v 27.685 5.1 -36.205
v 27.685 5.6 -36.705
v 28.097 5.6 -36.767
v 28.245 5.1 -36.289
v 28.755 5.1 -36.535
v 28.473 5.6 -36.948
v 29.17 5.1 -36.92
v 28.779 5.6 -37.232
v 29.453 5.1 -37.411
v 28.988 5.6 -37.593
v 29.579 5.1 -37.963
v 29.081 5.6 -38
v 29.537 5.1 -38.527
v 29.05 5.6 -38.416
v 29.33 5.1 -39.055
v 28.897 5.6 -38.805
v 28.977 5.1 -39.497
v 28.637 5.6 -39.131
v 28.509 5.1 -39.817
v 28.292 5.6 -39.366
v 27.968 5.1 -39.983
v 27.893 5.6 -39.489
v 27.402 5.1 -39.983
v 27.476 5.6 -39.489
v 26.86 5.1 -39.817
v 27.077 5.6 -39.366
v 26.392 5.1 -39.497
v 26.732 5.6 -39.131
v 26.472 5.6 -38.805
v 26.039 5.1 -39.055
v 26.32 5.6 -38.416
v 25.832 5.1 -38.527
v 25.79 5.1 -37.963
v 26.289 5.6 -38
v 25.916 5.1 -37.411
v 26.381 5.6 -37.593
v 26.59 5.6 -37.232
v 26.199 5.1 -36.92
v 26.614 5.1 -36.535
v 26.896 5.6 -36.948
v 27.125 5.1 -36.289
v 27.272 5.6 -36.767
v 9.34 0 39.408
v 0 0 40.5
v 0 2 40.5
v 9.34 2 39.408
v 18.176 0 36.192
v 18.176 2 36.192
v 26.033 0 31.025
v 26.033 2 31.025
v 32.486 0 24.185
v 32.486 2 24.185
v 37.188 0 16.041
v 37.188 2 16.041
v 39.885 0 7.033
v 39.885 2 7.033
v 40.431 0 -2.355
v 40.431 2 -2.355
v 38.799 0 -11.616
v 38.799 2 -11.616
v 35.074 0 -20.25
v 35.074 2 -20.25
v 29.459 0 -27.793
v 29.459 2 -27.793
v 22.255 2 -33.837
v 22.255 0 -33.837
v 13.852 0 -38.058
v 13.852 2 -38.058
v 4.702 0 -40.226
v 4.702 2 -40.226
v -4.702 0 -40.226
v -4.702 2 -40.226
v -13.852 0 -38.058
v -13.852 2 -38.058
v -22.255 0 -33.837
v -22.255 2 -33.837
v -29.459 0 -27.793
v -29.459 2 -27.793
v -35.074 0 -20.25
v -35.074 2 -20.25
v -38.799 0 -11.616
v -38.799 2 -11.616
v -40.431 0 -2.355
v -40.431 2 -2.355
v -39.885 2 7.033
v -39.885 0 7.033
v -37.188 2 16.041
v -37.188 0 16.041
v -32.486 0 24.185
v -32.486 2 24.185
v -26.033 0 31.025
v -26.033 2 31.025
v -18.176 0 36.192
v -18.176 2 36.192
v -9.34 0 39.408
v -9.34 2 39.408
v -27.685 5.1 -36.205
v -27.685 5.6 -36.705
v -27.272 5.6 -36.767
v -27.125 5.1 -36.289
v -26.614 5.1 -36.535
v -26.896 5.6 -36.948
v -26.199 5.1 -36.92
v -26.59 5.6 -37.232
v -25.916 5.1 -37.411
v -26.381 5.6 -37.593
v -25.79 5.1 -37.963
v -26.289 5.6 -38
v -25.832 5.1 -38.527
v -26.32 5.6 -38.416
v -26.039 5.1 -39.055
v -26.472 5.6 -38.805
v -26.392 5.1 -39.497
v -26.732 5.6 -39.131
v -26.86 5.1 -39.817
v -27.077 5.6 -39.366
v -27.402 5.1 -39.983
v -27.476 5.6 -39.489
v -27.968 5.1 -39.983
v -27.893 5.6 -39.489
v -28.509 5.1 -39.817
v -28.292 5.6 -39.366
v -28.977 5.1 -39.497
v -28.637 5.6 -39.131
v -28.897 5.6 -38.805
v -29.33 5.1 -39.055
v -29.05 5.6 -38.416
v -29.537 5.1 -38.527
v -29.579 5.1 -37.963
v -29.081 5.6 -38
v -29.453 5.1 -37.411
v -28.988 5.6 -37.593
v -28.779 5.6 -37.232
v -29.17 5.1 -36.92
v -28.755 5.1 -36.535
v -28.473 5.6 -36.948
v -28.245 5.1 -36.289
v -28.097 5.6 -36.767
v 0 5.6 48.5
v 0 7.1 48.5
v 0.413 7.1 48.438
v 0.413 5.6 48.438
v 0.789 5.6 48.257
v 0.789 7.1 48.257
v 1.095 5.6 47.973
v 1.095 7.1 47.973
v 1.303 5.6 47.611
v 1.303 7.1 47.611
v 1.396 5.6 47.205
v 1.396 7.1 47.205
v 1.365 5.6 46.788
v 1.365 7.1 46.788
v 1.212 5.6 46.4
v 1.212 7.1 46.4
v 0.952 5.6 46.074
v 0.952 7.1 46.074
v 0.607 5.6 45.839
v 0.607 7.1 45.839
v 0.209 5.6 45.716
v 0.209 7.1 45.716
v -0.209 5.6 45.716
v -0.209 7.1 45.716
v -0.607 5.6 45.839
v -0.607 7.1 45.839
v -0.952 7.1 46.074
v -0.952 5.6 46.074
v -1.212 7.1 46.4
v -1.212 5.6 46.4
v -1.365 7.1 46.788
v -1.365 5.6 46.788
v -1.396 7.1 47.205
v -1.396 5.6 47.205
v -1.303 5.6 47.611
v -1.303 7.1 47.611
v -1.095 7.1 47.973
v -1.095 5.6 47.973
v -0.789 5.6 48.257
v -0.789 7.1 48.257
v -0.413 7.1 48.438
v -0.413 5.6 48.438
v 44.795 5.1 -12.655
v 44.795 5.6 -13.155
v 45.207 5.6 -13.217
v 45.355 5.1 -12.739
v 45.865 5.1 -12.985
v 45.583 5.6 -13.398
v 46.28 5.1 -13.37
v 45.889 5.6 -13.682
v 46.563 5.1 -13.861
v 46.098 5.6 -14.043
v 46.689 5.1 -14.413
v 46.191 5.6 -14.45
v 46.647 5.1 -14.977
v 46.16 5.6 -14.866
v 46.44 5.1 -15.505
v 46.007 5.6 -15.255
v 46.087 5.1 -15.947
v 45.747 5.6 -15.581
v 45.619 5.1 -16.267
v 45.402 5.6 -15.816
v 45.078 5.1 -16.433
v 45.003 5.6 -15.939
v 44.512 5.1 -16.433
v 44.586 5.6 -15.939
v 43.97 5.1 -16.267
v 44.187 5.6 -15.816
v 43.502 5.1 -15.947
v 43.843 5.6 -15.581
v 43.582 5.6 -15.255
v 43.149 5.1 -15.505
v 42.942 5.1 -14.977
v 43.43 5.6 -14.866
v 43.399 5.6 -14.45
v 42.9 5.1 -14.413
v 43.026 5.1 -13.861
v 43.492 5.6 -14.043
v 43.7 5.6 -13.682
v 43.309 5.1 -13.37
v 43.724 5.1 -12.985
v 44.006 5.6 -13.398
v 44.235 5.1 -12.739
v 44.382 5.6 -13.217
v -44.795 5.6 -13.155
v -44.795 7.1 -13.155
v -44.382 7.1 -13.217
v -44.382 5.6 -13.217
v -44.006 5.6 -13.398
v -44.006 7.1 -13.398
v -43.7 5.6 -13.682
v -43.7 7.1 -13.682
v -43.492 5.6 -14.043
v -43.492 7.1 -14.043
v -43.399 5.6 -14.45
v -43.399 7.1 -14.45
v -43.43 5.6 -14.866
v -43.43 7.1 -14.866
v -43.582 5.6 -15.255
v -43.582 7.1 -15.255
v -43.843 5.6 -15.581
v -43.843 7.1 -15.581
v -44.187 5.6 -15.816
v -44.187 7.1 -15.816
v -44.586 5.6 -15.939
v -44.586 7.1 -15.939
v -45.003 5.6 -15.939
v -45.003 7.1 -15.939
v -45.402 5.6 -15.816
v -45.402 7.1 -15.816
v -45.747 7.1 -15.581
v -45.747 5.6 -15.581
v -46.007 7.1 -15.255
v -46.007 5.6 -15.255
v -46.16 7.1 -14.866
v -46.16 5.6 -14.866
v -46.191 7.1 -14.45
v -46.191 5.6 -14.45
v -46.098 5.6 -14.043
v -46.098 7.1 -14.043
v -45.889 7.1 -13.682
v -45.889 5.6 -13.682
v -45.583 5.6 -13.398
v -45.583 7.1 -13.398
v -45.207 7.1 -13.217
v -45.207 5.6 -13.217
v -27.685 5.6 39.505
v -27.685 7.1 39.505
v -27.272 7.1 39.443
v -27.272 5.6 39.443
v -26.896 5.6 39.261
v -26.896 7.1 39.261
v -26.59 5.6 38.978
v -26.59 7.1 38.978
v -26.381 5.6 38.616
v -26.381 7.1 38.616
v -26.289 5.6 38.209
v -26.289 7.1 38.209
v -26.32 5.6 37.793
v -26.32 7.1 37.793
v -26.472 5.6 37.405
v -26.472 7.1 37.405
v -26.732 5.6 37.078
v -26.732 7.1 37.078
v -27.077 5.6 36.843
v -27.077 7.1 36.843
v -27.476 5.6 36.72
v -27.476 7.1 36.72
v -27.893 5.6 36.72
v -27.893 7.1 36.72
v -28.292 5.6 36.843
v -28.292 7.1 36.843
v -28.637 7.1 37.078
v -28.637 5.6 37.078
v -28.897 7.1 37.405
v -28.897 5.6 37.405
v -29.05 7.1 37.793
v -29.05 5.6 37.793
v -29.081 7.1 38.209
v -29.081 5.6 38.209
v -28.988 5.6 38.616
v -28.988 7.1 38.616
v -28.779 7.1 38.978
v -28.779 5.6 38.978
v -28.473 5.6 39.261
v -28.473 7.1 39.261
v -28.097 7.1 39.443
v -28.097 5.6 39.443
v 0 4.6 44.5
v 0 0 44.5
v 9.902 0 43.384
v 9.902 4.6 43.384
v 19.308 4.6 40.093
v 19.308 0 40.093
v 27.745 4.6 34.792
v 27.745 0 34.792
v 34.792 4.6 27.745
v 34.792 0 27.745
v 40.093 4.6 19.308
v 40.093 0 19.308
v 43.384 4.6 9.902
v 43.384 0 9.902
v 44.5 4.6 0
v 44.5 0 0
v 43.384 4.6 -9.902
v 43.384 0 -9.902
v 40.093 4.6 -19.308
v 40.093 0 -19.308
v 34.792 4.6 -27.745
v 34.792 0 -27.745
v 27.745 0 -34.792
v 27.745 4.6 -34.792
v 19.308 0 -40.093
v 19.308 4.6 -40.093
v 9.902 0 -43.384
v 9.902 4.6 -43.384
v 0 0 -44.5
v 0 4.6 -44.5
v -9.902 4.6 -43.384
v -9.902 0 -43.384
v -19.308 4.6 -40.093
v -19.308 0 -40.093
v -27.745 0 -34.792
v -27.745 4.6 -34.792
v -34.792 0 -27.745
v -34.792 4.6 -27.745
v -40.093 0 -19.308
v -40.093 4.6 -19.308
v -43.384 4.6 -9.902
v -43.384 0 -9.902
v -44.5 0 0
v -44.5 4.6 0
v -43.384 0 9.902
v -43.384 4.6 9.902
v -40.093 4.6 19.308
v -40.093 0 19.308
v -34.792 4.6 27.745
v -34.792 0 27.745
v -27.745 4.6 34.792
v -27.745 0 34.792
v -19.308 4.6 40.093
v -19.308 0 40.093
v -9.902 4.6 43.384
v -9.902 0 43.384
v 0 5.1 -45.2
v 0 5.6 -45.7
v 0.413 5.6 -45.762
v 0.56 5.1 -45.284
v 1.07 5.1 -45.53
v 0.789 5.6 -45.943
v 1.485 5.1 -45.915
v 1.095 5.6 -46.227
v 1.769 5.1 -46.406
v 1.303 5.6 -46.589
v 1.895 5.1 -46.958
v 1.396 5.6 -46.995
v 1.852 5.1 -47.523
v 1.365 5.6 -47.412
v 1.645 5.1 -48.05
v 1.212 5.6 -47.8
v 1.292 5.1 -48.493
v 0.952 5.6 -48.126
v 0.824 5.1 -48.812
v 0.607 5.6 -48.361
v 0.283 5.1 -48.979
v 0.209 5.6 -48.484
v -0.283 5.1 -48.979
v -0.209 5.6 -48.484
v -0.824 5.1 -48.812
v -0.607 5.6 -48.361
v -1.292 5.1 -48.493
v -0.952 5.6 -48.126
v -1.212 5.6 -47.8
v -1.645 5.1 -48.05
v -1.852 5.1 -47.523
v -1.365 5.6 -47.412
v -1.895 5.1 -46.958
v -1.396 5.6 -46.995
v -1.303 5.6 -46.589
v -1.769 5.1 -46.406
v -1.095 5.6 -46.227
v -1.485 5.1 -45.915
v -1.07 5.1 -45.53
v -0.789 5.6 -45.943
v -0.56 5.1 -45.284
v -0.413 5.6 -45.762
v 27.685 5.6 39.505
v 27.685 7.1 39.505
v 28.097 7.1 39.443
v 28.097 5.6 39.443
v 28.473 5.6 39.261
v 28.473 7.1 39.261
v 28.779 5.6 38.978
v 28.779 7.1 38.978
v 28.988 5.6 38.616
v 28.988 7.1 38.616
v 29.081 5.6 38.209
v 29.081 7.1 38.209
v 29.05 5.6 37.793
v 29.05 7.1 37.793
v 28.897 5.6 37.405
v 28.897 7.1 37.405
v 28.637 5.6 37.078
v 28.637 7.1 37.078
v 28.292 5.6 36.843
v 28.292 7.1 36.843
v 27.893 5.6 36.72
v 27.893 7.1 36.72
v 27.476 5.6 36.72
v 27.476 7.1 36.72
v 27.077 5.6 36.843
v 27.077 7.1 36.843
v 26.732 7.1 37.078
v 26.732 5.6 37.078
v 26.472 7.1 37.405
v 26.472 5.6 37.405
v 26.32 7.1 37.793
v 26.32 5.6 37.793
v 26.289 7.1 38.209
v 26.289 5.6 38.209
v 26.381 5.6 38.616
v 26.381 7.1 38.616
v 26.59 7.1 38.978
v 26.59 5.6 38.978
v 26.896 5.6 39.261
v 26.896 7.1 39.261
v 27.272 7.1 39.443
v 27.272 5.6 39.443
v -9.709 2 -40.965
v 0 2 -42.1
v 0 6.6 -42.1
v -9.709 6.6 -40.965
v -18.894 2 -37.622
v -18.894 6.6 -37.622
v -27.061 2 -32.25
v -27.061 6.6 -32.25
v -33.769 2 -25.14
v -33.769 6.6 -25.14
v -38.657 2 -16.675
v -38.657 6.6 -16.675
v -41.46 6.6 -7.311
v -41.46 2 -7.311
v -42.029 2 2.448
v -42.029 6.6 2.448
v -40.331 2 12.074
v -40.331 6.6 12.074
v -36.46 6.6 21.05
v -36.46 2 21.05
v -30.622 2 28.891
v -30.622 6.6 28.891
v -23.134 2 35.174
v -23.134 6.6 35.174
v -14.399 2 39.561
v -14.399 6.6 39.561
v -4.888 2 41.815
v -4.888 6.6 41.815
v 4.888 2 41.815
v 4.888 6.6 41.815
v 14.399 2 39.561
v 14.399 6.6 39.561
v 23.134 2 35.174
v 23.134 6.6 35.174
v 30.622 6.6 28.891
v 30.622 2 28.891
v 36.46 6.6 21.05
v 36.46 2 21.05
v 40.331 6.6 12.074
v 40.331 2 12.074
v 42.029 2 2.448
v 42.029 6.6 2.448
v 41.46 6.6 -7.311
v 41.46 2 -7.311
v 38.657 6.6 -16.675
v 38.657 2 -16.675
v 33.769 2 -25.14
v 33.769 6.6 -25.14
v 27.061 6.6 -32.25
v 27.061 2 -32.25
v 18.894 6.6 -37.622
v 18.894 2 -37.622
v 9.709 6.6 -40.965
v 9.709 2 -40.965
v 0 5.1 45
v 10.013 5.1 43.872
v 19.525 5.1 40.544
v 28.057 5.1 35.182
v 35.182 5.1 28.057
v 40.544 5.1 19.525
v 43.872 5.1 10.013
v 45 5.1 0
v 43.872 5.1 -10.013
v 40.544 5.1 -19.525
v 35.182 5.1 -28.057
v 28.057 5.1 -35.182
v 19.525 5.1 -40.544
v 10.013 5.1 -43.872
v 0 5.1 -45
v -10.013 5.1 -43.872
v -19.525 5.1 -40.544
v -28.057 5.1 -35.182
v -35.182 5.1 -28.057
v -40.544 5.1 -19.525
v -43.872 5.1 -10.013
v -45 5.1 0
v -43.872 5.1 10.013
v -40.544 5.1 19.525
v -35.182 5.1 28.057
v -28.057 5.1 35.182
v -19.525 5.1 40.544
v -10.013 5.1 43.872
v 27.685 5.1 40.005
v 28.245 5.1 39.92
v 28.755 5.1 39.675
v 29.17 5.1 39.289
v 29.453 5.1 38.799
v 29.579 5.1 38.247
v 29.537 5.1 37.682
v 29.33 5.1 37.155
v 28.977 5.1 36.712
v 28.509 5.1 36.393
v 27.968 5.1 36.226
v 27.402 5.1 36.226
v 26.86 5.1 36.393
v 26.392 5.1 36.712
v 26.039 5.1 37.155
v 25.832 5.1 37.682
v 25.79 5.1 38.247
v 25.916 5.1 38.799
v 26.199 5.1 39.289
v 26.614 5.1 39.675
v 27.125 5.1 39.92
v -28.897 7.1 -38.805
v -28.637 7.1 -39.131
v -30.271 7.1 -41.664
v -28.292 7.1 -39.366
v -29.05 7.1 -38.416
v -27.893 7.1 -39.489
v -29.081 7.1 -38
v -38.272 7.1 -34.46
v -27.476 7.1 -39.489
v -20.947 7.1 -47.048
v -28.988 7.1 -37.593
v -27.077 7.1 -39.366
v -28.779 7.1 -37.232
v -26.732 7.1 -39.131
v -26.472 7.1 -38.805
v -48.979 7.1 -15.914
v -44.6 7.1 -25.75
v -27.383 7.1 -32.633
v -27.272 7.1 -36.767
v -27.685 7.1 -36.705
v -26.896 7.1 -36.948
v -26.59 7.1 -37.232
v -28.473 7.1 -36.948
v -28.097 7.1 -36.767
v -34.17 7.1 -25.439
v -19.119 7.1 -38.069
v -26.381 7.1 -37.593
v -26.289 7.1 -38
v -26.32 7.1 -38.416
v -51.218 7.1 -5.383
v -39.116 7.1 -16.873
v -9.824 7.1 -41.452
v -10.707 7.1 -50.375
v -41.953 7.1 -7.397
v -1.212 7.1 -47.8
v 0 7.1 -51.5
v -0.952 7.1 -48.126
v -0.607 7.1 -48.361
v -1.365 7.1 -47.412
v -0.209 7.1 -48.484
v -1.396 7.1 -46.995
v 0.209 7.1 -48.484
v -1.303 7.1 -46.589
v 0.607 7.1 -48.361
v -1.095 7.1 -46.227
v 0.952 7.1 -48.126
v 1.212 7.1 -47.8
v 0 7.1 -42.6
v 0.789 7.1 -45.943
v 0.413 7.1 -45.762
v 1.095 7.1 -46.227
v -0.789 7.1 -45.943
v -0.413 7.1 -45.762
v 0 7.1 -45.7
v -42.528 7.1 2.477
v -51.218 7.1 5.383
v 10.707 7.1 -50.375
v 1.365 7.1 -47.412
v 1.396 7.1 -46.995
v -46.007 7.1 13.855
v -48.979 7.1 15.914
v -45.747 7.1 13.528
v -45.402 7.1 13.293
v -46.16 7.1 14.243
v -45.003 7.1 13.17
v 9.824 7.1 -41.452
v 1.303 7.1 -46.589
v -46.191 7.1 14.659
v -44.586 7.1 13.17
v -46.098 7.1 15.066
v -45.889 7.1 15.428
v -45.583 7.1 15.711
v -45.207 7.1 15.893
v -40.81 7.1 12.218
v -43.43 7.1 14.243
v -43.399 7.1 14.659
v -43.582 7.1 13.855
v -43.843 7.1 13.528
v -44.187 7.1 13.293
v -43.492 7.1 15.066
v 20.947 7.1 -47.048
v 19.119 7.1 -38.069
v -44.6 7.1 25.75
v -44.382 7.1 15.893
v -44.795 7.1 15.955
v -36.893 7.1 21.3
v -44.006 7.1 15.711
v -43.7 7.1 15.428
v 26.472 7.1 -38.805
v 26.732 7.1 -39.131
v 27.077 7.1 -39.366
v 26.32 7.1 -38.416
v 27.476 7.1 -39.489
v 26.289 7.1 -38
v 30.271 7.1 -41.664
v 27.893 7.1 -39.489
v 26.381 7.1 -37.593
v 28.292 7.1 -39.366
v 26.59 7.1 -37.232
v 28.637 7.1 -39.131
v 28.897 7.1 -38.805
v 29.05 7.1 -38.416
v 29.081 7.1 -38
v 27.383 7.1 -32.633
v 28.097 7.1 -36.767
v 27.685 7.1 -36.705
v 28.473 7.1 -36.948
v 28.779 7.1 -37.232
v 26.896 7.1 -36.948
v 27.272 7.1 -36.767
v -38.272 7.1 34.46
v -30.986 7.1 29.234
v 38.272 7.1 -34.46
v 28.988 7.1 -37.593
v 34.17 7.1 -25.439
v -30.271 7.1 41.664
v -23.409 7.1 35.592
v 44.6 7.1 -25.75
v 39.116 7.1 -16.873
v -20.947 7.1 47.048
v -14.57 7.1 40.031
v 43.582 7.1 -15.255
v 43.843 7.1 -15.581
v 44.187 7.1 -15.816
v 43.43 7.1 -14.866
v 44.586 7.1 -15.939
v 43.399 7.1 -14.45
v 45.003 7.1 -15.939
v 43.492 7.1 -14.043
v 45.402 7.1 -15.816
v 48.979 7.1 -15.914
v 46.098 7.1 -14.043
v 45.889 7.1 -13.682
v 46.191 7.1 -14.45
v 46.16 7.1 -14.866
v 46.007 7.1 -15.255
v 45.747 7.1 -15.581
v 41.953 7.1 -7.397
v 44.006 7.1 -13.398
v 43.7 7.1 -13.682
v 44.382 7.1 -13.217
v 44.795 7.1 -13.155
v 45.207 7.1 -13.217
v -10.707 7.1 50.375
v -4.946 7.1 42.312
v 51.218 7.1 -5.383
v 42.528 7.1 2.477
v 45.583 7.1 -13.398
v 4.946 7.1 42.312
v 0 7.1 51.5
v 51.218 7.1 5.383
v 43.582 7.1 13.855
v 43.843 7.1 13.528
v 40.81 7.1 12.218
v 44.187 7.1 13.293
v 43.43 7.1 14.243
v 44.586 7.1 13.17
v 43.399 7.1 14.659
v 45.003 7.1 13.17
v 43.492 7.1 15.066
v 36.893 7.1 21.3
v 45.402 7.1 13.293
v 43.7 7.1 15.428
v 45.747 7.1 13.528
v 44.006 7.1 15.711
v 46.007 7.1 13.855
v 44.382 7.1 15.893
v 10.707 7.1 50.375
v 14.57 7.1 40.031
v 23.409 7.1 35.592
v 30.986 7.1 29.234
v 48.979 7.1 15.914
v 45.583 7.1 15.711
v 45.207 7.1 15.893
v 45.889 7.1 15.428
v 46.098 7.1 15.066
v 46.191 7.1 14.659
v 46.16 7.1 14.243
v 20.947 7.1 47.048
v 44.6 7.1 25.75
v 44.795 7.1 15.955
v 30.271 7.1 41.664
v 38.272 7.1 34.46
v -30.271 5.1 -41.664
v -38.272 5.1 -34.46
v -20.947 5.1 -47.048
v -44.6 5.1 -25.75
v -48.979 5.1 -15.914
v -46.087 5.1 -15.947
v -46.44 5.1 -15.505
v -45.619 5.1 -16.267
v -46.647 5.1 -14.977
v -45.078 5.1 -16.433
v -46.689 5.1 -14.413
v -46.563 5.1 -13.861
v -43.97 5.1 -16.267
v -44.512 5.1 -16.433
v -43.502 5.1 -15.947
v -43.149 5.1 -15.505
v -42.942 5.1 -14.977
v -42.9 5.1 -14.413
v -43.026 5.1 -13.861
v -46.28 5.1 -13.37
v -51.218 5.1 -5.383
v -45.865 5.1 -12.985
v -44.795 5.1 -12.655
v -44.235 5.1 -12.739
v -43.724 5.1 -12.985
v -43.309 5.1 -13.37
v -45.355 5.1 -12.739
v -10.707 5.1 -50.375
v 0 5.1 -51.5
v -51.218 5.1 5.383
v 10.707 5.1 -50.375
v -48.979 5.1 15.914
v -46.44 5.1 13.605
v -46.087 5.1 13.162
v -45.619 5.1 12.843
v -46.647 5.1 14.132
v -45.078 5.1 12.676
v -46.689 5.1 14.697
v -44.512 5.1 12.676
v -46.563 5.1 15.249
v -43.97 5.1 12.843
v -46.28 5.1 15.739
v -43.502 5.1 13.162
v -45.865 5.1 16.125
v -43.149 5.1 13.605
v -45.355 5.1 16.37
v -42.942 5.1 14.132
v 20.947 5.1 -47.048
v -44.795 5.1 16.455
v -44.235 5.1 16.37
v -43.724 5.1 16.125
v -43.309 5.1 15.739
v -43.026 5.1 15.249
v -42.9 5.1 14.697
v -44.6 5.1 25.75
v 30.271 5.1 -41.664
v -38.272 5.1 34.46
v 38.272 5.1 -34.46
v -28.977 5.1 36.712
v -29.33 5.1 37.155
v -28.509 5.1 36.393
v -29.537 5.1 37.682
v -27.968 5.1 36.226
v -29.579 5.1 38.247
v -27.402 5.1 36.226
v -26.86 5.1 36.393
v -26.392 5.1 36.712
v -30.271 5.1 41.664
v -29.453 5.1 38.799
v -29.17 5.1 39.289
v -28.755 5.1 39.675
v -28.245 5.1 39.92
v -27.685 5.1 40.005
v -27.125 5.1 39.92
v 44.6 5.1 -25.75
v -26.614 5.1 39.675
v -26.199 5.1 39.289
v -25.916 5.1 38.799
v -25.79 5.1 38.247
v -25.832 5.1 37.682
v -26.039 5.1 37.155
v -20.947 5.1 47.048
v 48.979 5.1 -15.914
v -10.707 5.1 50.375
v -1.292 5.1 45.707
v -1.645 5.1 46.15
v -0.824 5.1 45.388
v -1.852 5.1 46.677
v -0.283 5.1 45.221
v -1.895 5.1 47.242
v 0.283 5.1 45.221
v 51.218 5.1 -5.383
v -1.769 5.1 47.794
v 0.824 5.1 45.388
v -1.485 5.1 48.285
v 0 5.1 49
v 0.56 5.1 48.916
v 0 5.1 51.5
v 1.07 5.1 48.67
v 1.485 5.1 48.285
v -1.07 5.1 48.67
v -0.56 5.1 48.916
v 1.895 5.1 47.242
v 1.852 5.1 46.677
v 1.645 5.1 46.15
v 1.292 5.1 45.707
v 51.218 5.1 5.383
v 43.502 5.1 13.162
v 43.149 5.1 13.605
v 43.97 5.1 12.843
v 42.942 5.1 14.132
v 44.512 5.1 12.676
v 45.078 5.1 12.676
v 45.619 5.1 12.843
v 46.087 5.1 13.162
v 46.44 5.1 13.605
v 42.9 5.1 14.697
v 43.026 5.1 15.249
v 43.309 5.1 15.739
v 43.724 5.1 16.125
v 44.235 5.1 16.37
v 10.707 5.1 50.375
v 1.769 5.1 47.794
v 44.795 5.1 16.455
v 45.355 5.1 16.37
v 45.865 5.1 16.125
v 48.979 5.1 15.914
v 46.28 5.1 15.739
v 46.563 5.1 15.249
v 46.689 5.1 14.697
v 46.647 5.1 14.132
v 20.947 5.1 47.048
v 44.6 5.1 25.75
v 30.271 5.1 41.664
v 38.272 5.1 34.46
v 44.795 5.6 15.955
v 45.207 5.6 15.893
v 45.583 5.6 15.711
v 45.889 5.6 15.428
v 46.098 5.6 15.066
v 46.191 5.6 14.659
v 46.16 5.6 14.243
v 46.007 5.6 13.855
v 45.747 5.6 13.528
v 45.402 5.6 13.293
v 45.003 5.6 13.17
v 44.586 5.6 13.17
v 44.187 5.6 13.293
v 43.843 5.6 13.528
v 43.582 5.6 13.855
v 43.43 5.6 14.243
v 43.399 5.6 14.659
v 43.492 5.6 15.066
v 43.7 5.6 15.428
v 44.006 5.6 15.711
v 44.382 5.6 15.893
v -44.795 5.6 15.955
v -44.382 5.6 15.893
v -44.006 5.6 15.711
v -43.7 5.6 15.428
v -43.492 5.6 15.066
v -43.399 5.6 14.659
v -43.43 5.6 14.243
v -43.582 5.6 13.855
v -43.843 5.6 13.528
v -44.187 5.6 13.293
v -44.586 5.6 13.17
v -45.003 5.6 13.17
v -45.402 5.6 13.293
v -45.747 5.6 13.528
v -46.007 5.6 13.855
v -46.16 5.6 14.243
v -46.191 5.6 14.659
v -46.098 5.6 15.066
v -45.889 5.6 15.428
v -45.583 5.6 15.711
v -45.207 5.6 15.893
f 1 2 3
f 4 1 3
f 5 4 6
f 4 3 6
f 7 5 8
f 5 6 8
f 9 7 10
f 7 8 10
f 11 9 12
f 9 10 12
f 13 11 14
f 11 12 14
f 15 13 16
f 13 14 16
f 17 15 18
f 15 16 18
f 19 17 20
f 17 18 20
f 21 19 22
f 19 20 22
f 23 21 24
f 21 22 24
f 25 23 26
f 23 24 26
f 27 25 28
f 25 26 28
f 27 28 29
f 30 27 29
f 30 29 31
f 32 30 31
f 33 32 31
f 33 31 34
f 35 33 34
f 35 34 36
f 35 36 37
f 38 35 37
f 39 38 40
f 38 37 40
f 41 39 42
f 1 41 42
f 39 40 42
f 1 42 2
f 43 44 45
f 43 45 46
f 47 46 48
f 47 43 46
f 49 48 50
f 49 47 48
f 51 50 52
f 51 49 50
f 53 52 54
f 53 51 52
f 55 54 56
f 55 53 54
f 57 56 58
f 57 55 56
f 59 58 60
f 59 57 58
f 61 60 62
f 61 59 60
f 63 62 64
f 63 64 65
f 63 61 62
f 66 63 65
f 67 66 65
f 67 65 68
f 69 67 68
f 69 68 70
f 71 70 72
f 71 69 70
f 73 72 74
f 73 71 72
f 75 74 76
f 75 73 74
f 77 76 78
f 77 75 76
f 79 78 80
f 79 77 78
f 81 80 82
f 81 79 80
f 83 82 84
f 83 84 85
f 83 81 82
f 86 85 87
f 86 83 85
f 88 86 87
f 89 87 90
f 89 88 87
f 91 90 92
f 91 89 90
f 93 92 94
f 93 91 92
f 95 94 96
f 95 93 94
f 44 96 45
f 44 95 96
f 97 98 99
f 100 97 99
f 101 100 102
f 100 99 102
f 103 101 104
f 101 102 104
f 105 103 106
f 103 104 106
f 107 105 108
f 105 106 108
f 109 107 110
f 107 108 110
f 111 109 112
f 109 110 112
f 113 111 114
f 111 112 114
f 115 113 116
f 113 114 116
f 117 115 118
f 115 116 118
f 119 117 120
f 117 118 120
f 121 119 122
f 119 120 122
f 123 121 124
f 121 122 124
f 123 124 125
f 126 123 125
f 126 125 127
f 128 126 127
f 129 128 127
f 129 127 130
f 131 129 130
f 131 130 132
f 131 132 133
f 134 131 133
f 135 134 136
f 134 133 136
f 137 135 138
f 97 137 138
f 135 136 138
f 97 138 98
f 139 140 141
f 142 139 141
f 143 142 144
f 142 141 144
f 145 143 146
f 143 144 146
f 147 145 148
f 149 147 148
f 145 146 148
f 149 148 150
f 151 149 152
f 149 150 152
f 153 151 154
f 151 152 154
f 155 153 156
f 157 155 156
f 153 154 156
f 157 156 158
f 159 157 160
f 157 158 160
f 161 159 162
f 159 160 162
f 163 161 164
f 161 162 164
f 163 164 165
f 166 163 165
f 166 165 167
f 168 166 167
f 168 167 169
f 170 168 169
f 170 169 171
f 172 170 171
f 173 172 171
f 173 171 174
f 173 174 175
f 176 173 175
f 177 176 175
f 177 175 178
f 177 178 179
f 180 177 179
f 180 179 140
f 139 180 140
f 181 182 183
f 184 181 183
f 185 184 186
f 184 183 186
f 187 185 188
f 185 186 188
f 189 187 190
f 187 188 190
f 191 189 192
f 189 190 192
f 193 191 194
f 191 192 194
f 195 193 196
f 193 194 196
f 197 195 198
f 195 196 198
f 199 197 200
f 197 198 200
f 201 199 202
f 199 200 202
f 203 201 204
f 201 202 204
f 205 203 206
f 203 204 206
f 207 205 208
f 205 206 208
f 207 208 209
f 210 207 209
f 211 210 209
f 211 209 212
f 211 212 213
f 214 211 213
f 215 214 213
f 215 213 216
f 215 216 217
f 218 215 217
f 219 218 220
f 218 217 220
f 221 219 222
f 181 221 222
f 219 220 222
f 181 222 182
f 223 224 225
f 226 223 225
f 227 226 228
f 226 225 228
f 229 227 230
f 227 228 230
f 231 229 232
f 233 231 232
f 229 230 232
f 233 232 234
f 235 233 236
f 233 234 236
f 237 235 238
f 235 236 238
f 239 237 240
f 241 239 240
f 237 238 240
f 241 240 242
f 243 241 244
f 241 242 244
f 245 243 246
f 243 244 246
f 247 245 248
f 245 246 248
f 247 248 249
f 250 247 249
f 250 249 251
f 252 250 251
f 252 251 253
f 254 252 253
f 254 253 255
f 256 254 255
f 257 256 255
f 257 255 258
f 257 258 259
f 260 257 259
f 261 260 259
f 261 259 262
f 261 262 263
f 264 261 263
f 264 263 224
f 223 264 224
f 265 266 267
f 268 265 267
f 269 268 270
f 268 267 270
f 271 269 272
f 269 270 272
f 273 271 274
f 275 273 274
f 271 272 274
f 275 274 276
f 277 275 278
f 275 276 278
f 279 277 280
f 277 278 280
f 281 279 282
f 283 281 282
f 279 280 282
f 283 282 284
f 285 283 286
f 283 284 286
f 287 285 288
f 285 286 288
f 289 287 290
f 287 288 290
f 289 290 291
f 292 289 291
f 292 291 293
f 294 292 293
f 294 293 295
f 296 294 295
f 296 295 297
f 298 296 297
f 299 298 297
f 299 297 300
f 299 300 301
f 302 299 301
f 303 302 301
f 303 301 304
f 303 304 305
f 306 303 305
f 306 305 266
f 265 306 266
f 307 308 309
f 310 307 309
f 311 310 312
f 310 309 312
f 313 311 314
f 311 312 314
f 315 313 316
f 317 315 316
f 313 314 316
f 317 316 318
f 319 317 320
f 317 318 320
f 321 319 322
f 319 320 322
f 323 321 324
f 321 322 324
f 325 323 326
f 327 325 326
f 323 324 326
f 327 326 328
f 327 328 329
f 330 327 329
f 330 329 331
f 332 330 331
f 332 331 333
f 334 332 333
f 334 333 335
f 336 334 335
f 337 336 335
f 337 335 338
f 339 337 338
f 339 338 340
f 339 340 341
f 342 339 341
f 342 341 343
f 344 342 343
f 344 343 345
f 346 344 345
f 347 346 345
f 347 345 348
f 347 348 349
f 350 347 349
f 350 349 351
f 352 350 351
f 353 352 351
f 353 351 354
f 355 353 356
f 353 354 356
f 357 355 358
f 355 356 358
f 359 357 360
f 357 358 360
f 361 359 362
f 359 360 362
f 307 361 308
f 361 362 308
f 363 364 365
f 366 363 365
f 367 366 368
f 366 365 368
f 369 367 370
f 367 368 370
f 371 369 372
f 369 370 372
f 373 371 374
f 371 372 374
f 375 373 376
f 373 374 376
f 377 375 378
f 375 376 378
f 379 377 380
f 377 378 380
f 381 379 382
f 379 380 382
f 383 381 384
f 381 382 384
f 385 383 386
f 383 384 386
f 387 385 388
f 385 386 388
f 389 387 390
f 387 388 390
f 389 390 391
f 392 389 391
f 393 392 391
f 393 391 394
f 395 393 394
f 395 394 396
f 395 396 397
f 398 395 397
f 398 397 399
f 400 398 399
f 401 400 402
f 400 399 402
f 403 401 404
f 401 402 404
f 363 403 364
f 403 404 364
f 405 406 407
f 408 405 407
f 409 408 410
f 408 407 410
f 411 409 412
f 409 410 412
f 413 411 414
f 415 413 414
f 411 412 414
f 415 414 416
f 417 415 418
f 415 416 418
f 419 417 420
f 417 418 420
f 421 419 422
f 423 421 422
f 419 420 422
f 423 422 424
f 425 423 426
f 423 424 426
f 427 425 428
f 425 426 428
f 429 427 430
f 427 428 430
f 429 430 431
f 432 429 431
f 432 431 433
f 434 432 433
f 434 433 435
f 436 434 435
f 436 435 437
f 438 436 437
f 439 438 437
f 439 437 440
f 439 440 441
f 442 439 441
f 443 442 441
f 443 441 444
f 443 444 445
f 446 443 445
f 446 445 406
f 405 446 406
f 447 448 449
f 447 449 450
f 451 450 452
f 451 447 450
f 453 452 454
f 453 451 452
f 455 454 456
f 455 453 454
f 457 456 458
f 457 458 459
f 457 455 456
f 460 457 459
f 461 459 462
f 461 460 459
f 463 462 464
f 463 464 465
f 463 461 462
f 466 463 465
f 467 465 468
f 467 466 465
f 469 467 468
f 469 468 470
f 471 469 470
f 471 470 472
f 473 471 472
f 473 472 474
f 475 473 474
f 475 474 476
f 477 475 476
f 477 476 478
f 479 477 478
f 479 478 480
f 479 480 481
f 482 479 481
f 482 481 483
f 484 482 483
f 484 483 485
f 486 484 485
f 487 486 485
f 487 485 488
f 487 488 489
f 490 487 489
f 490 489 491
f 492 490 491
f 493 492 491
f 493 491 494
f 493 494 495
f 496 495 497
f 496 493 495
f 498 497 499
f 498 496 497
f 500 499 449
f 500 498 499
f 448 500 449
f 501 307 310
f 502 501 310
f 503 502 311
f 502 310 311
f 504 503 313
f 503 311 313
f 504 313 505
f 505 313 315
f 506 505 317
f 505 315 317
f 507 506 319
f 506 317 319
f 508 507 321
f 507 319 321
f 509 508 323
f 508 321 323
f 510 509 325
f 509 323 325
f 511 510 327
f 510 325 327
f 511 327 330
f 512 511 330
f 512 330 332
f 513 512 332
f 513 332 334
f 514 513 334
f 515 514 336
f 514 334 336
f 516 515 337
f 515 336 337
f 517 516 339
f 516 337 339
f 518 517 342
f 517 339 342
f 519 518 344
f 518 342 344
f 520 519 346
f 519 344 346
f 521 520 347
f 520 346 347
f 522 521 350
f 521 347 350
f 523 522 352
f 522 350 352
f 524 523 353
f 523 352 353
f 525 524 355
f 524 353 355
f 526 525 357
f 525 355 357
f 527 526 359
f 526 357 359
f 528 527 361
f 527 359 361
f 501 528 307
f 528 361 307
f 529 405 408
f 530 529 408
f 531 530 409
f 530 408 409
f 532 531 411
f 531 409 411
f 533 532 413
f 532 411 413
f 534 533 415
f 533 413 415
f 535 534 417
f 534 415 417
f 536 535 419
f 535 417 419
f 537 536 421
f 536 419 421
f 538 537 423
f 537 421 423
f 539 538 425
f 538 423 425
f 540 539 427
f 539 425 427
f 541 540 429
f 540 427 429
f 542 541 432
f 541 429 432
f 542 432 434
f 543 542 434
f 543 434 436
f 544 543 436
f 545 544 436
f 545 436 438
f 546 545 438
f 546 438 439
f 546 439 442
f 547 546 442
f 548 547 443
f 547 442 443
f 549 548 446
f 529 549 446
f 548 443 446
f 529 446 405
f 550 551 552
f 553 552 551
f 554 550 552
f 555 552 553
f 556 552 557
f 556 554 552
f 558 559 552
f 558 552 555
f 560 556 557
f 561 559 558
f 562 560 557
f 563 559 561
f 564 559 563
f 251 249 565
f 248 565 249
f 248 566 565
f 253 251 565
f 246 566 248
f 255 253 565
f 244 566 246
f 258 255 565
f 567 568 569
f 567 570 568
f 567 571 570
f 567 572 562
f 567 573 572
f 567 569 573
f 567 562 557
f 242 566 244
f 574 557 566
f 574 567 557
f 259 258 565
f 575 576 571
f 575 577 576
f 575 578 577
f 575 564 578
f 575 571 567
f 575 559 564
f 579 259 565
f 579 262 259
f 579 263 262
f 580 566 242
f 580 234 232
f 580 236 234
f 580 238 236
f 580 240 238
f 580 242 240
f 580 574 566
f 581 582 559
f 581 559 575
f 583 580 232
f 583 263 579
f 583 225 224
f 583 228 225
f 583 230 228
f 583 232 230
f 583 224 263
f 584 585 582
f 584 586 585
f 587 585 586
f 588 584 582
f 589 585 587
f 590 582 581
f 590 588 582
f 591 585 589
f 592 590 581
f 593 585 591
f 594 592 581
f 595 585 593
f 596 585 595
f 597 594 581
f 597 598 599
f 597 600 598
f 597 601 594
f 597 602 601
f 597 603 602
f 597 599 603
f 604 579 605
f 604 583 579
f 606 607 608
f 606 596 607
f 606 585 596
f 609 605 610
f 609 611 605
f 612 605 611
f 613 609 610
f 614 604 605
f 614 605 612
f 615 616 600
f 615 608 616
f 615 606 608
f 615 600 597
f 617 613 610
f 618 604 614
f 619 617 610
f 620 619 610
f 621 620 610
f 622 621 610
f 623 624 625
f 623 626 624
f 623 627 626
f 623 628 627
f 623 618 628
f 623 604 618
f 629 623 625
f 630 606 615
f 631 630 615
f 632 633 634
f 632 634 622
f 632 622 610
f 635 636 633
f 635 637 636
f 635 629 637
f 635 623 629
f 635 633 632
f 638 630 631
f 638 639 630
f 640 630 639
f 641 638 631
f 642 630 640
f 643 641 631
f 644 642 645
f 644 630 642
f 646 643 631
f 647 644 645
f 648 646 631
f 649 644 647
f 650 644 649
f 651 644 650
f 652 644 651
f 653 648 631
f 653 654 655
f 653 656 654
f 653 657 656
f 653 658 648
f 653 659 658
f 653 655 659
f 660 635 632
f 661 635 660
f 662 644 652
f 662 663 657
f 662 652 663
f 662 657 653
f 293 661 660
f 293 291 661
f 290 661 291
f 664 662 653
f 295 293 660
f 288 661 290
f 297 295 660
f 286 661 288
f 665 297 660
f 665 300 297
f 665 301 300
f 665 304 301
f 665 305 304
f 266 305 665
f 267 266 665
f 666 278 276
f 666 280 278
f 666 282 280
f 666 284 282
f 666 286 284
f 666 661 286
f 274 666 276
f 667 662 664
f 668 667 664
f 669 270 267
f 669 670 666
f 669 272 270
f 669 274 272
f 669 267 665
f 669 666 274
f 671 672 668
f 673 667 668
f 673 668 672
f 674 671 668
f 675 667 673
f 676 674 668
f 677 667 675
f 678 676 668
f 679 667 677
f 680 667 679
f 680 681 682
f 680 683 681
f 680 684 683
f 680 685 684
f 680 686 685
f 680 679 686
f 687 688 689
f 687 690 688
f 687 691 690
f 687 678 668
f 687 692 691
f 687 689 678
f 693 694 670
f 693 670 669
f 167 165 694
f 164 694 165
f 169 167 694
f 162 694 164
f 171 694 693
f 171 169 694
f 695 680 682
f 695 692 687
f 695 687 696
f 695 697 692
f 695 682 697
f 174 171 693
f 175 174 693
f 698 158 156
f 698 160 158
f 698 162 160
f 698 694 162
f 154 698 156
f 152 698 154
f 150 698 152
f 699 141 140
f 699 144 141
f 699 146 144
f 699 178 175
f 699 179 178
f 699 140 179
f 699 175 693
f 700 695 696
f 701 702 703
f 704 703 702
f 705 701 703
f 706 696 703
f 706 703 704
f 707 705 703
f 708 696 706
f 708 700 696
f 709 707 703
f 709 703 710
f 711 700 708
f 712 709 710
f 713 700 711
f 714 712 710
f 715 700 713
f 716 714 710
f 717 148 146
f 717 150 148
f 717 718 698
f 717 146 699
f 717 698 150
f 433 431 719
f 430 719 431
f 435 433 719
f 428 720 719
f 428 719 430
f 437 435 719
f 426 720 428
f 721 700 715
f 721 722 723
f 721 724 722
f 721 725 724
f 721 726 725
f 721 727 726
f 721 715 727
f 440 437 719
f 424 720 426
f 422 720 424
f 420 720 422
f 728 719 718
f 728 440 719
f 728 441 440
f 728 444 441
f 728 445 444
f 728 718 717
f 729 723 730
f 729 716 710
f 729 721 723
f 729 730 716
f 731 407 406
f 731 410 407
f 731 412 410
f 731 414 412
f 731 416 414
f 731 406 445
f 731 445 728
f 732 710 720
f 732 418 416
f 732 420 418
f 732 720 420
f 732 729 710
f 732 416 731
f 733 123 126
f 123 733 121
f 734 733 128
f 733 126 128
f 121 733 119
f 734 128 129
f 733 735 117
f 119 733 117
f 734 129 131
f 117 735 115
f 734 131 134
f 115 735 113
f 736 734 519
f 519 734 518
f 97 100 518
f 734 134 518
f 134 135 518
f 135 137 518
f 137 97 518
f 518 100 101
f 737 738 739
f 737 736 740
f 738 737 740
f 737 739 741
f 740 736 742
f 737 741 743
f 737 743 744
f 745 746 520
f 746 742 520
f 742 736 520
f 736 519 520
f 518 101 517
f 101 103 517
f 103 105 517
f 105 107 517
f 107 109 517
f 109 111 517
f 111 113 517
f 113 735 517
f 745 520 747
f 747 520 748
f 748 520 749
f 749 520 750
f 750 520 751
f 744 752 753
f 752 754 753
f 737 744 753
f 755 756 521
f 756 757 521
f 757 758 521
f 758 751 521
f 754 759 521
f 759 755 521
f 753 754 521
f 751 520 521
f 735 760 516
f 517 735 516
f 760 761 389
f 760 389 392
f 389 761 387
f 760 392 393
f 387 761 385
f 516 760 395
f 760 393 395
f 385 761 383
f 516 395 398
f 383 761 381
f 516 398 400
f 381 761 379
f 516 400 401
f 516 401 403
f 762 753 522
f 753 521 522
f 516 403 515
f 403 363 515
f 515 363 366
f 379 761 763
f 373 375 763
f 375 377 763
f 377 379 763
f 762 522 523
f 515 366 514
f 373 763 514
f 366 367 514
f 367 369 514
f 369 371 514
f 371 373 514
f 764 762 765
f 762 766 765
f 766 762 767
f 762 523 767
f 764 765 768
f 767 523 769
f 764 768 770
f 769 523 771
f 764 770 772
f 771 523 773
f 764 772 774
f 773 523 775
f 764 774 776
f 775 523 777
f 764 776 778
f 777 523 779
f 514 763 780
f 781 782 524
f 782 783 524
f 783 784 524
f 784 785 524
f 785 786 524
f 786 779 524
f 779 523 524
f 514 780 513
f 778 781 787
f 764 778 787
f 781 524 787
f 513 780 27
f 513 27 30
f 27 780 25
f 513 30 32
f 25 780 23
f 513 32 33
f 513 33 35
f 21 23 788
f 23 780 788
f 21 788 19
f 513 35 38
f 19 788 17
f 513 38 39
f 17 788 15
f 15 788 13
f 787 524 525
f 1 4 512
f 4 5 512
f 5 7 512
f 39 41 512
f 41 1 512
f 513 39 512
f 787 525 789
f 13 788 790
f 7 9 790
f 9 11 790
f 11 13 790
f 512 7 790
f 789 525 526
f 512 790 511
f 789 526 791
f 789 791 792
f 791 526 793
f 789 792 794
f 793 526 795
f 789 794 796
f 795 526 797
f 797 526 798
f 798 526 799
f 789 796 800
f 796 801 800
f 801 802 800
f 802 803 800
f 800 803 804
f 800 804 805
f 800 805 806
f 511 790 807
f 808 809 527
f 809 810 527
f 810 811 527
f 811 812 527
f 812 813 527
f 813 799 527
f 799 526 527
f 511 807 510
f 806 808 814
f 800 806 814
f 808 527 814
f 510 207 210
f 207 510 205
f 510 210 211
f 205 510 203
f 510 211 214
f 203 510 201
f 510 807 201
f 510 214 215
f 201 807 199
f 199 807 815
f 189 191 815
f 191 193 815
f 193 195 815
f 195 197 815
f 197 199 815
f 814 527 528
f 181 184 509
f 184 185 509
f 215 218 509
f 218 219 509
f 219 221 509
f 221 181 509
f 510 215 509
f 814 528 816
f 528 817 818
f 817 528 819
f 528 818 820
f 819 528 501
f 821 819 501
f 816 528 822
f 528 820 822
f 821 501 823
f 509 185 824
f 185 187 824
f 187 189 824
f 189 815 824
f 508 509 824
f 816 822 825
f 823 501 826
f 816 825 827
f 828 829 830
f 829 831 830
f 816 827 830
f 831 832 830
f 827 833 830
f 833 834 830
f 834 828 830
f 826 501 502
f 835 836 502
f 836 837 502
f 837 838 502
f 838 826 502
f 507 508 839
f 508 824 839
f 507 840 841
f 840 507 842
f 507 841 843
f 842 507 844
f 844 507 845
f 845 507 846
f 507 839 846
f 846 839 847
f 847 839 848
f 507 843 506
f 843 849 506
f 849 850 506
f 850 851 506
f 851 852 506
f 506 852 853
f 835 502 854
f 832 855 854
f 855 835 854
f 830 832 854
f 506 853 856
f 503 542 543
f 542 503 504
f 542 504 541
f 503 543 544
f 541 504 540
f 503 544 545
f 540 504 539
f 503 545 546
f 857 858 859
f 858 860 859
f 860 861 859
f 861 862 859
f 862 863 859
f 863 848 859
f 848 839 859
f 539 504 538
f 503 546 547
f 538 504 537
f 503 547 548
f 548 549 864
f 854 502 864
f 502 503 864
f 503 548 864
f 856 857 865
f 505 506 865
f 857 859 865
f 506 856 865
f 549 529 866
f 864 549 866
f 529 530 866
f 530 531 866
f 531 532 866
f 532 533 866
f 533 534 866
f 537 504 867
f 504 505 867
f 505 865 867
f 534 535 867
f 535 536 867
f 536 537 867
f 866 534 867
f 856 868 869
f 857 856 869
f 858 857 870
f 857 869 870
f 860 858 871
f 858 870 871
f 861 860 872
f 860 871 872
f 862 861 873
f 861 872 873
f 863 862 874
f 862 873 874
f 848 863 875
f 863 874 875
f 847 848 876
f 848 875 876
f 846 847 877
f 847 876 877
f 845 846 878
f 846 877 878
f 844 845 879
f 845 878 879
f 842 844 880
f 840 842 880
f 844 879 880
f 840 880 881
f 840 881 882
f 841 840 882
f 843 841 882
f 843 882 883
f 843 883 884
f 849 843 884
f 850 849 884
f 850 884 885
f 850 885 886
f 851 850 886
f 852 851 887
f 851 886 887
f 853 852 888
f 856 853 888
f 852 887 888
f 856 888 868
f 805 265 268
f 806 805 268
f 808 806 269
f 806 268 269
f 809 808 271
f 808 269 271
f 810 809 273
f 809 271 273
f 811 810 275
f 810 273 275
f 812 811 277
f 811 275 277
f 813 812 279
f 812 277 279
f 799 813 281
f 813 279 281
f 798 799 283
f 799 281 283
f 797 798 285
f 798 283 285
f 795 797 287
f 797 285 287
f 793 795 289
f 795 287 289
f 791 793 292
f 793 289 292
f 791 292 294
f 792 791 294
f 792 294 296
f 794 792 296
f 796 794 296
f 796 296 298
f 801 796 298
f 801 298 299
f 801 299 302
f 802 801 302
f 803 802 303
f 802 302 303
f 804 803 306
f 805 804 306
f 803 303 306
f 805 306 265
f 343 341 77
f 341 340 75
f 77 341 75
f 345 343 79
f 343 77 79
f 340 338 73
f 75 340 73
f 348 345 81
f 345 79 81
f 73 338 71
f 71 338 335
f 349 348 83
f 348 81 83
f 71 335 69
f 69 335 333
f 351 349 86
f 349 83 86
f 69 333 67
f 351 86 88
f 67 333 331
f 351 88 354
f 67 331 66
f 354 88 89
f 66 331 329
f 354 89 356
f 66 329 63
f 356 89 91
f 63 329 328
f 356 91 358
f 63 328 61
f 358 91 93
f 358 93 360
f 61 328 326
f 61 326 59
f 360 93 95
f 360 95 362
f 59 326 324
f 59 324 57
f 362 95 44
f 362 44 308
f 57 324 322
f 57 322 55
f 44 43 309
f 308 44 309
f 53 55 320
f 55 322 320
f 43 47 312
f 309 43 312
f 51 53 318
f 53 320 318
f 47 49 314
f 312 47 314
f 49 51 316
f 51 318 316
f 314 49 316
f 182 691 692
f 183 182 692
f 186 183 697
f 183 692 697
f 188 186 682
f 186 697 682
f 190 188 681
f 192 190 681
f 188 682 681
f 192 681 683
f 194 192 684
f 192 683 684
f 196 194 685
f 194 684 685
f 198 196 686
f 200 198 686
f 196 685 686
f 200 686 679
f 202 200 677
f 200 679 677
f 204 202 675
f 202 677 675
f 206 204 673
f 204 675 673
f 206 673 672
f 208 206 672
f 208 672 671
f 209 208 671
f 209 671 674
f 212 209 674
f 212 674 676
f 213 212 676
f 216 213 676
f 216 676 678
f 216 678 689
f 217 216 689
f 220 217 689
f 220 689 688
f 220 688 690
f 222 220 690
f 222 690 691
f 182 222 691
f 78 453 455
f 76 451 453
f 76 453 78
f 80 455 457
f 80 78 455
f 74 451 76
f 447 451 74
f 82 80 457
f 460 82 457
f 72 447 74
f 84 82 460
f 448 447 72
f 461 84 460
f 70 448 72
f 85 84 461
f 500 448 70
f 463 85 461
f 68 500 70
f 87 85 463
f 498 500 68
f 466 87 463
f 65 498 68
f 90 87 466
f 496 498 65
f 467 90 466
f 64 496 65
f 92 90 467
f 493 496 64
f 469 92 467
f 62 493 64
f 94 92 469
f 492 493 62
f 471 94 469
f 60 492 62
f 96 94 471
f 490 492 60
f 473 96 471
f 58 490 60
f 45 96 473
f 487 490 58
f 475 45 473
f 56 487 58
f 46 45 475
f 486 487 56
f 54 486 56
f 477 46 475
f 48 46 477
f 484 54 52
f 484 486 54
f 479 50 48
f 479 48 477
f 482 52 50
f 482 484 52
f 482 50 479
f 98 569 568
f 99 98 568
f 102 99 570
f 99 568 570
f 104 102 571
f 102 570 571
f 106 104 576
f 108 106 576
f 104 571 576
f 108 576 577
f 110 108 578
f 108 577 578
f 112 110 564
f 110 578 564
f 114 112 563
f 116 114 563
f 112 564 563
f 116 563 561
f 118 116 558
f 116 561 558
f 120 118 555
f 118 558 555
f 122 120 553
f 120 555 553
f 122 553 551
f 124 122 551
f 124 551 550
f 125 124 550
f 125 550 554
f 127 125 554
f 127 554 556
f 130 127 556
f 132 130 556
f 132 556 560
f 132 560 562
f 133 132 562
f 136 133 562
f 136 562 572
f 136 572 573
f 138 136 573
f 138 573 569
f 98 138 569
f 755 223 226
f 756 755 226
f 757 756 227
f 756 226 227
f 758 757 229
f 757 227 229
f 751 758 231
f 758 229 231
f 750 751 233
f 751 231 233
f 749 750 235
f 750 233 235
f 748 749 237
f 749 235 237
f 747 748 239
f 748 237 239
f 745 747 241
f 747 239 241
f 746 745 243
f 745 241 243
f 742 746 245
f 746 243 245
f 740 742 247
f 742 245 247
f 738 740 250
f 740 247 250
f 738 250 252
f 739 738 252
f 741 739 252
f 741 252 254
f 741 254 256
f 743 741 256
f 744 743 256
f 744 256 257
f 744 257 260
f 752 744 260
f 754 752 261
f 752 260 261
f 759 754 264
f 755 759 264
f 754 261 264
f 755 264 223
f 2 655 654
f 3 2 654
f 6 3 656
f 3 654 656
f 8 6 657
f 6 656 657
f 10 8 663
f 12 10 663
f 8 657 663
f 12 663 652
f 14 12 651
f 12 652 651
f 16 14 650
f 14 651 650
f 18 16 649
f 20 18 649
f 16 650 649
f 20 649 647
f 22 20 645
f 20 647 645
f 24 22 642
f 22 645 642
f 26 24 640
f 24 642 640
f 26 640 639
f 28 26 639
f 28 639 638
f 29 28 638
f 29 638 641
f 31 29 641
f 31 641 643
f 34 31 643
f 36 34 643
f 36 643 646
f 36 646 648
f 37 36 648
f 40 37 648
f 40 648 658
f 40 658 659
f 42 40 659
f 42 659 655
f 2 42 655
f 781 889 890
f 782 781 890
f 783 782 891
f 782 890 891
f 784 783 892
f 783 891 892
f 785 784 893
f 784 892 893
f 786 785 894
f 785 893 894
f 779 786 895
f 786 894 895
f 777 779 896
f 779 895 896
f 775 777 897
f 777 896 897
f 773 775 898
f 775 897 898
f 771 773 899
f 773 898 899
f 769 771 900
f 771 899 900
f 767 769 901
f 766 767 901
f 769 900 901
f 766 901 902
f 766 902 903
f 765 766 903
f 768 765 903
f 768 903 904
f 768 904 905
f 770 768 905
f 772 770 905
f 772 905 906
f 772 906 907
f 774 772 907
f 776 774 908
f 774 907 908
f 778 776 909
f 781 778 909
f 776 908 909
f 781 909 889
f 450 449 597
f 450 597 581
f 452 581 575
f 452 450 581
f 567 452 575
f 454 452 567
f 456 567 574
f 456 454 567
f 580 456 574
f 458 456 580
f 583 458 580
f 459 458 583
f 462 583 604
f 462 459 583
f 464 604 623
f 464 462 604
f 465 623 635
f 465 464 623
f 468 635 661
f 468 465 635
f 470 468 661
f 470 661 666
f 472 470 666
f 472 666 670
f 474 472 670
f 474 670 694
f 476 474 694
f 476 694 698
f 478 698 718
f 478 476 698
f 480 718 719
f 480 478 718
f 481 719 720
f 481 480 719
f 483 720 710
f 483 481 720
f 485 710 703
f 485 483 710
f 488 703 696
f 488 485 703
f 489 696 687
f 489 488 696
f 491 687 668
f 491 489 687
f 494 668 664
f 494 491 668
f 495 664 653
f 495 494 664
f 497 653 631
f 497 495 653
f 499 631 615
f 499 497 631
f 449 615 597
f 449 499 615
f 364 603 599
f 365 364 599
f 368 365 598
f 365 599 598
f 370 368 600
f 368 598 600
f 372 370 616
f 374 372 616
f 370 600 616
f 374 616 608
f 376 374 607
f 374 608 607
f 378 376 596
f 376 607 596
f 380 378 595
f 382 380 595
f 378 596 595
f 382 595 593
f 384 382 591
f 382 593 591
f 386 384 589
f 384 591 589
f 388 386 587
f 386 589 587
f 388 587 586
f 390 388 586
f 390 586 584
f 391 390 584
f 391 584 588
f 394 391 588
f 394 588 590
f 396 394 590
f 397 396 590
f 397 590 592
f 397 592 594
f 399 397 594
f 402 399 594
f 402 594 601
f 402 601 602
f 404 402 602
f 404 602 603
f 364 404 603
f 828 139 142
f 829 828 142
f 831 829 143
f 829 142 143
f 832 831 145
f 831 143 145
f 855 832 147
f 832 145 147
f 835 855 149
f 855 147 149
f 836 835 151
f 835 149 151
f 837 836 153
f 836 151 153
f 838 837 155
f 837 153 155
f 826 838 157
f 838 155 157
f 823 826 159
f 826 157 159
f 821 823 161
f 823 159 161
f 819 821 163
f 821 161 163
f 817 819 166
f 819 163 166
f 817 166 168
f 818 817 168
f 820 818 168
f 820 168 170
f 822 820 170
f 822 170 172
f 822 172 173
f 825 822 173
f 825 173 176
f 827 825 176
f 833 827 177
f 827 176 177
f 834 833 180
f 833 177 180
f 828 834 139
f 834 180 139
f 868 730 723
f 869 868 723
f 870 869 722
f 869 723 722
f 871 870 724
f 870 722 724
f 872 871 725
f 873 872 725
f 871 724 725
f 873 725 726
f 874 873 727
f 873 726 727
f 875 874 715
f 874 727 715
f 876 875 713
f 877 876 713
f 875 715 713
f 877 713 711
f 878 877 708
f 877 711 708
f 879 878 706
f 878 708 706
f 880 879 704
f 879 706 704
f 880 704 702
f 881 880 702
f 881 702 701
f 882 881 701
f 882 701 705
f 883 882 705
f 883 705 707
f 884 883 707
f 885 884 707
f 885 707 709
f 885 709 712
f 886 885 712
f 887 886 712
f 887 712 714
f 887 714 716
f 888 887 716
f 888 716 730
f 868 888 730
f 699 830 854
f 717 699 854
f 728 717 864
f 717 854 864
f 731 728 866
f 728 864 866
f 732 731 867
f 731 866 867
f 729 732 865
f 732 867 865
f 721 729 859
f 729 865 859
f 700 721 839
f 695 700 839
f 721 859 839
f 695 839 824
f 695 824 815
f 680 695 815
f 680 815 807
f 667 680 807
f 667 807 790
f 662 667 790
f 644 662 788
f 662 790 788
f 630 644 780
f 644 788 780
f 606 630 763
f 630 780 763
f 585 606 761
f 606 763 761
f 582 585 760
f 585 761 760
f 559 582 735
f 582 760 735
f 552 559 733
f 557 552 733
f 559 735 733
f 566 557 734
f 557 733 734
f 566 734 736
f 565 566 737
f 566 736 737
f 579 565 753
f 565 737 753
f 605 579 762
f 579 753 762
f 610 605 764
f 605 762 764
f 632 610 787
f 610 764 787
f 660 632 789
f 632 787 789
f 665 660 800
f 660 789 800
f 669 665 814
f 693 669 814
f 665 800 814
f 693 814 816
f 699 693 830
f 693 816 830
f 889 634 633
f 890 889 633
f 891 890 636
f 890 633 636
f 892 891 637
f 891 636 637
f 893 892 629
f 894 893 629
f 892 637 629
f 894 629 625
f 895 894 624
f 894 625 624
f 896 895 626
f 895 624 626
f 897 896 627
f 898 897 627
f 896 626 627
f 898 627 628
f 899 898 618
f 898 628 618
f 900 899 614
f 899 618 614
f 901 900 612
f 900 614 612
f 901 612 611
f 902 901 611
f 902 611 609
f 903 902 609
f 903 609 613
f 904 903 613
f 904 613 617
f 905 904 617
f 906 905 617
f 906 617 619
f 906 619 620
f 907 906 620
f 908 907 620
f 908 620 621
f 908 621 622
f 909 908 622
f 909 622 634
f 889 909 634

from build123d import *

# Parameters (mm, degrees)
SKETCH_1_R          = 44.5
SKETCH_1_R_2        = 40.5
EXTRUDE_1_DEPTH     = 2
SKETCH_2_R          = 44.5
SKETCH_2_R_2        = 42.1
EXTRUDE_2_DEPTH     = 3.1
SKETCH_3_R          = 51.5
SKETCH_3_R_2        = 42.1
EXTRUDE_3_DEPTH     = 2
SKETCH_6_R          = 1.4
CUT_EXTRUDE_3_DEPTH = 74.177250563
CHAMFER_1_SIZE      = 0.5
CHAMFER_2_SIZE      = 0.5


with BuildPart() as part:
    # 스케치1 → 보스-돌출1 (new body)
    with BuildSketch(Plane(origin=(0, 0, 0), x_dir=(1, 0, 0), z_dir=(0, 1, 0))):
        with Locations(Location((0, 0, 0), (0, 0, 270))):
            Circle(SKETCH_1_R)
        with Locations(Location((0, 0, 0), (0, 0, 270))):
            Circle(SKETCH_1_R_2, mode=Mode.SUBTRACT)
    extrude(amount=EXTRUDE_1_DEPTH)

    # 스케치2 → 보스-돌출2 (add)
    with BuildSketch(Plane(origin=(0, 2, 0), x_dir=(1, 0, 0), z_dir=(0, 1, 0))):
        with Locations(Location((0, 0, 0), (0, 0, 270))):
            Circle(SKETCH_2_R)
        with Locations(Location((0, 0, 0), (0, 0, 90))):
            Circle(SKETCH_2_R_2, mode=Mode.SUBTRACT)
    extrude(amount=EXTRUDE_2_DEPTH)

    # 스케치3 → 보스-돌출3 (add)
    with BuildSketch(Plane(origin=(0, 5.1, 0), x_dir=(1, 0, 0), z_dir=(0, 1, 0))):
        with Locations(Location((0, 0, 0), (0, 0, 270))):
            Circle(SKETCH_3_R)
        with Locations(Location((0, 0, 0), (0, 0, 90))):
            Circle(SKETCH_3_R_2, mode=Mode.SUBTRACT)
    extrude(amount=EXTRUDE_3_DEPTH)

    # 스케치6 → 컷-돌출3 (cut, through all)
    with BuildSketch(Plane(origin=(0, 7.1, 0), x_dir=(1, 0, 0), z_dir=(0, 1, 0))):
        with Locations(Location((0, 47.1, 0), (0, 0, 270))):
            Circle(SKETCH_6_R)
        with Locations(Location((27.684685383, 38.104700435, 0), (0, 0, 270))):
            Circle(SKETCH_6_R)
        with Locations(Location((44.794761918, 14.554700435, 0), (0, 0, 270))):
            Circle(SKETCH_6_R)
        with Locations(Location((44.794761918, -14.554700435, 0), (0, 0, 270))):
            Circle(SKETCH_6_R)
        with Locations(Location((27.684685383, -38.104700435, 0), (0, 0, 270))):
            Circle(SKETCH_6_R)
        with Locations(Location((0, -47.1, 0), (0, 0, 270))):
            Circle(SKETCH_6_R)
        with Locations(Location((-27.684685383, -38.104700435, 0), (0, 0, 270))):
            Circle(SKETCH_6_R)
        with Locations(Location((-44.794761918, -14.554700435, 0), (0, 0, 270))):
            Circle(SKETCH_6_R)
        with Locations(Location((-44.794761918, 14.554700435, 0), (0, 0, 270))):
            Circle(SKETCH_6_R)
        with Locations(Location((-27.684685383, 38.104700435, 0), (0, 0, 270))):
            Circle(SKETCH_6_R)
    extrude(amount=-CUT_EXTRUDE_3_DEPTH, mode=Mode.SUBTRACT)

    # 모따기1
    chamfer_1_edges = [part.edges().sort_by_distance(p)[0] for p in [
        (0, 5.1, -48.5),
        (-27.684685383, 5.1, -39.504700435),
        (-44.794761918, 5.1, -15.954700435),
        (-44.794761918, 5.1, 13.154700435),
        (-27.684685383, 5.1, 36.704700435),
        (0, 5.1, 45.7),
        (27.684685383, 5.1, 36.704700435),
        (44.794761918, 5.1, 13.154700435),
        (44.794761918, 5.1, -15.954700435),
        (27.684685383, 5.1, -39.504700435),
    ]]
    chamfer(chamfer_1_edges, length=CHAMFER_1_SIZE)

    # 모따기2
    chamfer_2_edges = [part.edges().sort_by_distance(p)[0] for p in [
        (0, 5.1, -44.5),
        (0, 7.1, 42.1),
    ]]
    chamfer(chamfer_2_edges, length=CHAMFER_2_SIZE)


solid = part.part
